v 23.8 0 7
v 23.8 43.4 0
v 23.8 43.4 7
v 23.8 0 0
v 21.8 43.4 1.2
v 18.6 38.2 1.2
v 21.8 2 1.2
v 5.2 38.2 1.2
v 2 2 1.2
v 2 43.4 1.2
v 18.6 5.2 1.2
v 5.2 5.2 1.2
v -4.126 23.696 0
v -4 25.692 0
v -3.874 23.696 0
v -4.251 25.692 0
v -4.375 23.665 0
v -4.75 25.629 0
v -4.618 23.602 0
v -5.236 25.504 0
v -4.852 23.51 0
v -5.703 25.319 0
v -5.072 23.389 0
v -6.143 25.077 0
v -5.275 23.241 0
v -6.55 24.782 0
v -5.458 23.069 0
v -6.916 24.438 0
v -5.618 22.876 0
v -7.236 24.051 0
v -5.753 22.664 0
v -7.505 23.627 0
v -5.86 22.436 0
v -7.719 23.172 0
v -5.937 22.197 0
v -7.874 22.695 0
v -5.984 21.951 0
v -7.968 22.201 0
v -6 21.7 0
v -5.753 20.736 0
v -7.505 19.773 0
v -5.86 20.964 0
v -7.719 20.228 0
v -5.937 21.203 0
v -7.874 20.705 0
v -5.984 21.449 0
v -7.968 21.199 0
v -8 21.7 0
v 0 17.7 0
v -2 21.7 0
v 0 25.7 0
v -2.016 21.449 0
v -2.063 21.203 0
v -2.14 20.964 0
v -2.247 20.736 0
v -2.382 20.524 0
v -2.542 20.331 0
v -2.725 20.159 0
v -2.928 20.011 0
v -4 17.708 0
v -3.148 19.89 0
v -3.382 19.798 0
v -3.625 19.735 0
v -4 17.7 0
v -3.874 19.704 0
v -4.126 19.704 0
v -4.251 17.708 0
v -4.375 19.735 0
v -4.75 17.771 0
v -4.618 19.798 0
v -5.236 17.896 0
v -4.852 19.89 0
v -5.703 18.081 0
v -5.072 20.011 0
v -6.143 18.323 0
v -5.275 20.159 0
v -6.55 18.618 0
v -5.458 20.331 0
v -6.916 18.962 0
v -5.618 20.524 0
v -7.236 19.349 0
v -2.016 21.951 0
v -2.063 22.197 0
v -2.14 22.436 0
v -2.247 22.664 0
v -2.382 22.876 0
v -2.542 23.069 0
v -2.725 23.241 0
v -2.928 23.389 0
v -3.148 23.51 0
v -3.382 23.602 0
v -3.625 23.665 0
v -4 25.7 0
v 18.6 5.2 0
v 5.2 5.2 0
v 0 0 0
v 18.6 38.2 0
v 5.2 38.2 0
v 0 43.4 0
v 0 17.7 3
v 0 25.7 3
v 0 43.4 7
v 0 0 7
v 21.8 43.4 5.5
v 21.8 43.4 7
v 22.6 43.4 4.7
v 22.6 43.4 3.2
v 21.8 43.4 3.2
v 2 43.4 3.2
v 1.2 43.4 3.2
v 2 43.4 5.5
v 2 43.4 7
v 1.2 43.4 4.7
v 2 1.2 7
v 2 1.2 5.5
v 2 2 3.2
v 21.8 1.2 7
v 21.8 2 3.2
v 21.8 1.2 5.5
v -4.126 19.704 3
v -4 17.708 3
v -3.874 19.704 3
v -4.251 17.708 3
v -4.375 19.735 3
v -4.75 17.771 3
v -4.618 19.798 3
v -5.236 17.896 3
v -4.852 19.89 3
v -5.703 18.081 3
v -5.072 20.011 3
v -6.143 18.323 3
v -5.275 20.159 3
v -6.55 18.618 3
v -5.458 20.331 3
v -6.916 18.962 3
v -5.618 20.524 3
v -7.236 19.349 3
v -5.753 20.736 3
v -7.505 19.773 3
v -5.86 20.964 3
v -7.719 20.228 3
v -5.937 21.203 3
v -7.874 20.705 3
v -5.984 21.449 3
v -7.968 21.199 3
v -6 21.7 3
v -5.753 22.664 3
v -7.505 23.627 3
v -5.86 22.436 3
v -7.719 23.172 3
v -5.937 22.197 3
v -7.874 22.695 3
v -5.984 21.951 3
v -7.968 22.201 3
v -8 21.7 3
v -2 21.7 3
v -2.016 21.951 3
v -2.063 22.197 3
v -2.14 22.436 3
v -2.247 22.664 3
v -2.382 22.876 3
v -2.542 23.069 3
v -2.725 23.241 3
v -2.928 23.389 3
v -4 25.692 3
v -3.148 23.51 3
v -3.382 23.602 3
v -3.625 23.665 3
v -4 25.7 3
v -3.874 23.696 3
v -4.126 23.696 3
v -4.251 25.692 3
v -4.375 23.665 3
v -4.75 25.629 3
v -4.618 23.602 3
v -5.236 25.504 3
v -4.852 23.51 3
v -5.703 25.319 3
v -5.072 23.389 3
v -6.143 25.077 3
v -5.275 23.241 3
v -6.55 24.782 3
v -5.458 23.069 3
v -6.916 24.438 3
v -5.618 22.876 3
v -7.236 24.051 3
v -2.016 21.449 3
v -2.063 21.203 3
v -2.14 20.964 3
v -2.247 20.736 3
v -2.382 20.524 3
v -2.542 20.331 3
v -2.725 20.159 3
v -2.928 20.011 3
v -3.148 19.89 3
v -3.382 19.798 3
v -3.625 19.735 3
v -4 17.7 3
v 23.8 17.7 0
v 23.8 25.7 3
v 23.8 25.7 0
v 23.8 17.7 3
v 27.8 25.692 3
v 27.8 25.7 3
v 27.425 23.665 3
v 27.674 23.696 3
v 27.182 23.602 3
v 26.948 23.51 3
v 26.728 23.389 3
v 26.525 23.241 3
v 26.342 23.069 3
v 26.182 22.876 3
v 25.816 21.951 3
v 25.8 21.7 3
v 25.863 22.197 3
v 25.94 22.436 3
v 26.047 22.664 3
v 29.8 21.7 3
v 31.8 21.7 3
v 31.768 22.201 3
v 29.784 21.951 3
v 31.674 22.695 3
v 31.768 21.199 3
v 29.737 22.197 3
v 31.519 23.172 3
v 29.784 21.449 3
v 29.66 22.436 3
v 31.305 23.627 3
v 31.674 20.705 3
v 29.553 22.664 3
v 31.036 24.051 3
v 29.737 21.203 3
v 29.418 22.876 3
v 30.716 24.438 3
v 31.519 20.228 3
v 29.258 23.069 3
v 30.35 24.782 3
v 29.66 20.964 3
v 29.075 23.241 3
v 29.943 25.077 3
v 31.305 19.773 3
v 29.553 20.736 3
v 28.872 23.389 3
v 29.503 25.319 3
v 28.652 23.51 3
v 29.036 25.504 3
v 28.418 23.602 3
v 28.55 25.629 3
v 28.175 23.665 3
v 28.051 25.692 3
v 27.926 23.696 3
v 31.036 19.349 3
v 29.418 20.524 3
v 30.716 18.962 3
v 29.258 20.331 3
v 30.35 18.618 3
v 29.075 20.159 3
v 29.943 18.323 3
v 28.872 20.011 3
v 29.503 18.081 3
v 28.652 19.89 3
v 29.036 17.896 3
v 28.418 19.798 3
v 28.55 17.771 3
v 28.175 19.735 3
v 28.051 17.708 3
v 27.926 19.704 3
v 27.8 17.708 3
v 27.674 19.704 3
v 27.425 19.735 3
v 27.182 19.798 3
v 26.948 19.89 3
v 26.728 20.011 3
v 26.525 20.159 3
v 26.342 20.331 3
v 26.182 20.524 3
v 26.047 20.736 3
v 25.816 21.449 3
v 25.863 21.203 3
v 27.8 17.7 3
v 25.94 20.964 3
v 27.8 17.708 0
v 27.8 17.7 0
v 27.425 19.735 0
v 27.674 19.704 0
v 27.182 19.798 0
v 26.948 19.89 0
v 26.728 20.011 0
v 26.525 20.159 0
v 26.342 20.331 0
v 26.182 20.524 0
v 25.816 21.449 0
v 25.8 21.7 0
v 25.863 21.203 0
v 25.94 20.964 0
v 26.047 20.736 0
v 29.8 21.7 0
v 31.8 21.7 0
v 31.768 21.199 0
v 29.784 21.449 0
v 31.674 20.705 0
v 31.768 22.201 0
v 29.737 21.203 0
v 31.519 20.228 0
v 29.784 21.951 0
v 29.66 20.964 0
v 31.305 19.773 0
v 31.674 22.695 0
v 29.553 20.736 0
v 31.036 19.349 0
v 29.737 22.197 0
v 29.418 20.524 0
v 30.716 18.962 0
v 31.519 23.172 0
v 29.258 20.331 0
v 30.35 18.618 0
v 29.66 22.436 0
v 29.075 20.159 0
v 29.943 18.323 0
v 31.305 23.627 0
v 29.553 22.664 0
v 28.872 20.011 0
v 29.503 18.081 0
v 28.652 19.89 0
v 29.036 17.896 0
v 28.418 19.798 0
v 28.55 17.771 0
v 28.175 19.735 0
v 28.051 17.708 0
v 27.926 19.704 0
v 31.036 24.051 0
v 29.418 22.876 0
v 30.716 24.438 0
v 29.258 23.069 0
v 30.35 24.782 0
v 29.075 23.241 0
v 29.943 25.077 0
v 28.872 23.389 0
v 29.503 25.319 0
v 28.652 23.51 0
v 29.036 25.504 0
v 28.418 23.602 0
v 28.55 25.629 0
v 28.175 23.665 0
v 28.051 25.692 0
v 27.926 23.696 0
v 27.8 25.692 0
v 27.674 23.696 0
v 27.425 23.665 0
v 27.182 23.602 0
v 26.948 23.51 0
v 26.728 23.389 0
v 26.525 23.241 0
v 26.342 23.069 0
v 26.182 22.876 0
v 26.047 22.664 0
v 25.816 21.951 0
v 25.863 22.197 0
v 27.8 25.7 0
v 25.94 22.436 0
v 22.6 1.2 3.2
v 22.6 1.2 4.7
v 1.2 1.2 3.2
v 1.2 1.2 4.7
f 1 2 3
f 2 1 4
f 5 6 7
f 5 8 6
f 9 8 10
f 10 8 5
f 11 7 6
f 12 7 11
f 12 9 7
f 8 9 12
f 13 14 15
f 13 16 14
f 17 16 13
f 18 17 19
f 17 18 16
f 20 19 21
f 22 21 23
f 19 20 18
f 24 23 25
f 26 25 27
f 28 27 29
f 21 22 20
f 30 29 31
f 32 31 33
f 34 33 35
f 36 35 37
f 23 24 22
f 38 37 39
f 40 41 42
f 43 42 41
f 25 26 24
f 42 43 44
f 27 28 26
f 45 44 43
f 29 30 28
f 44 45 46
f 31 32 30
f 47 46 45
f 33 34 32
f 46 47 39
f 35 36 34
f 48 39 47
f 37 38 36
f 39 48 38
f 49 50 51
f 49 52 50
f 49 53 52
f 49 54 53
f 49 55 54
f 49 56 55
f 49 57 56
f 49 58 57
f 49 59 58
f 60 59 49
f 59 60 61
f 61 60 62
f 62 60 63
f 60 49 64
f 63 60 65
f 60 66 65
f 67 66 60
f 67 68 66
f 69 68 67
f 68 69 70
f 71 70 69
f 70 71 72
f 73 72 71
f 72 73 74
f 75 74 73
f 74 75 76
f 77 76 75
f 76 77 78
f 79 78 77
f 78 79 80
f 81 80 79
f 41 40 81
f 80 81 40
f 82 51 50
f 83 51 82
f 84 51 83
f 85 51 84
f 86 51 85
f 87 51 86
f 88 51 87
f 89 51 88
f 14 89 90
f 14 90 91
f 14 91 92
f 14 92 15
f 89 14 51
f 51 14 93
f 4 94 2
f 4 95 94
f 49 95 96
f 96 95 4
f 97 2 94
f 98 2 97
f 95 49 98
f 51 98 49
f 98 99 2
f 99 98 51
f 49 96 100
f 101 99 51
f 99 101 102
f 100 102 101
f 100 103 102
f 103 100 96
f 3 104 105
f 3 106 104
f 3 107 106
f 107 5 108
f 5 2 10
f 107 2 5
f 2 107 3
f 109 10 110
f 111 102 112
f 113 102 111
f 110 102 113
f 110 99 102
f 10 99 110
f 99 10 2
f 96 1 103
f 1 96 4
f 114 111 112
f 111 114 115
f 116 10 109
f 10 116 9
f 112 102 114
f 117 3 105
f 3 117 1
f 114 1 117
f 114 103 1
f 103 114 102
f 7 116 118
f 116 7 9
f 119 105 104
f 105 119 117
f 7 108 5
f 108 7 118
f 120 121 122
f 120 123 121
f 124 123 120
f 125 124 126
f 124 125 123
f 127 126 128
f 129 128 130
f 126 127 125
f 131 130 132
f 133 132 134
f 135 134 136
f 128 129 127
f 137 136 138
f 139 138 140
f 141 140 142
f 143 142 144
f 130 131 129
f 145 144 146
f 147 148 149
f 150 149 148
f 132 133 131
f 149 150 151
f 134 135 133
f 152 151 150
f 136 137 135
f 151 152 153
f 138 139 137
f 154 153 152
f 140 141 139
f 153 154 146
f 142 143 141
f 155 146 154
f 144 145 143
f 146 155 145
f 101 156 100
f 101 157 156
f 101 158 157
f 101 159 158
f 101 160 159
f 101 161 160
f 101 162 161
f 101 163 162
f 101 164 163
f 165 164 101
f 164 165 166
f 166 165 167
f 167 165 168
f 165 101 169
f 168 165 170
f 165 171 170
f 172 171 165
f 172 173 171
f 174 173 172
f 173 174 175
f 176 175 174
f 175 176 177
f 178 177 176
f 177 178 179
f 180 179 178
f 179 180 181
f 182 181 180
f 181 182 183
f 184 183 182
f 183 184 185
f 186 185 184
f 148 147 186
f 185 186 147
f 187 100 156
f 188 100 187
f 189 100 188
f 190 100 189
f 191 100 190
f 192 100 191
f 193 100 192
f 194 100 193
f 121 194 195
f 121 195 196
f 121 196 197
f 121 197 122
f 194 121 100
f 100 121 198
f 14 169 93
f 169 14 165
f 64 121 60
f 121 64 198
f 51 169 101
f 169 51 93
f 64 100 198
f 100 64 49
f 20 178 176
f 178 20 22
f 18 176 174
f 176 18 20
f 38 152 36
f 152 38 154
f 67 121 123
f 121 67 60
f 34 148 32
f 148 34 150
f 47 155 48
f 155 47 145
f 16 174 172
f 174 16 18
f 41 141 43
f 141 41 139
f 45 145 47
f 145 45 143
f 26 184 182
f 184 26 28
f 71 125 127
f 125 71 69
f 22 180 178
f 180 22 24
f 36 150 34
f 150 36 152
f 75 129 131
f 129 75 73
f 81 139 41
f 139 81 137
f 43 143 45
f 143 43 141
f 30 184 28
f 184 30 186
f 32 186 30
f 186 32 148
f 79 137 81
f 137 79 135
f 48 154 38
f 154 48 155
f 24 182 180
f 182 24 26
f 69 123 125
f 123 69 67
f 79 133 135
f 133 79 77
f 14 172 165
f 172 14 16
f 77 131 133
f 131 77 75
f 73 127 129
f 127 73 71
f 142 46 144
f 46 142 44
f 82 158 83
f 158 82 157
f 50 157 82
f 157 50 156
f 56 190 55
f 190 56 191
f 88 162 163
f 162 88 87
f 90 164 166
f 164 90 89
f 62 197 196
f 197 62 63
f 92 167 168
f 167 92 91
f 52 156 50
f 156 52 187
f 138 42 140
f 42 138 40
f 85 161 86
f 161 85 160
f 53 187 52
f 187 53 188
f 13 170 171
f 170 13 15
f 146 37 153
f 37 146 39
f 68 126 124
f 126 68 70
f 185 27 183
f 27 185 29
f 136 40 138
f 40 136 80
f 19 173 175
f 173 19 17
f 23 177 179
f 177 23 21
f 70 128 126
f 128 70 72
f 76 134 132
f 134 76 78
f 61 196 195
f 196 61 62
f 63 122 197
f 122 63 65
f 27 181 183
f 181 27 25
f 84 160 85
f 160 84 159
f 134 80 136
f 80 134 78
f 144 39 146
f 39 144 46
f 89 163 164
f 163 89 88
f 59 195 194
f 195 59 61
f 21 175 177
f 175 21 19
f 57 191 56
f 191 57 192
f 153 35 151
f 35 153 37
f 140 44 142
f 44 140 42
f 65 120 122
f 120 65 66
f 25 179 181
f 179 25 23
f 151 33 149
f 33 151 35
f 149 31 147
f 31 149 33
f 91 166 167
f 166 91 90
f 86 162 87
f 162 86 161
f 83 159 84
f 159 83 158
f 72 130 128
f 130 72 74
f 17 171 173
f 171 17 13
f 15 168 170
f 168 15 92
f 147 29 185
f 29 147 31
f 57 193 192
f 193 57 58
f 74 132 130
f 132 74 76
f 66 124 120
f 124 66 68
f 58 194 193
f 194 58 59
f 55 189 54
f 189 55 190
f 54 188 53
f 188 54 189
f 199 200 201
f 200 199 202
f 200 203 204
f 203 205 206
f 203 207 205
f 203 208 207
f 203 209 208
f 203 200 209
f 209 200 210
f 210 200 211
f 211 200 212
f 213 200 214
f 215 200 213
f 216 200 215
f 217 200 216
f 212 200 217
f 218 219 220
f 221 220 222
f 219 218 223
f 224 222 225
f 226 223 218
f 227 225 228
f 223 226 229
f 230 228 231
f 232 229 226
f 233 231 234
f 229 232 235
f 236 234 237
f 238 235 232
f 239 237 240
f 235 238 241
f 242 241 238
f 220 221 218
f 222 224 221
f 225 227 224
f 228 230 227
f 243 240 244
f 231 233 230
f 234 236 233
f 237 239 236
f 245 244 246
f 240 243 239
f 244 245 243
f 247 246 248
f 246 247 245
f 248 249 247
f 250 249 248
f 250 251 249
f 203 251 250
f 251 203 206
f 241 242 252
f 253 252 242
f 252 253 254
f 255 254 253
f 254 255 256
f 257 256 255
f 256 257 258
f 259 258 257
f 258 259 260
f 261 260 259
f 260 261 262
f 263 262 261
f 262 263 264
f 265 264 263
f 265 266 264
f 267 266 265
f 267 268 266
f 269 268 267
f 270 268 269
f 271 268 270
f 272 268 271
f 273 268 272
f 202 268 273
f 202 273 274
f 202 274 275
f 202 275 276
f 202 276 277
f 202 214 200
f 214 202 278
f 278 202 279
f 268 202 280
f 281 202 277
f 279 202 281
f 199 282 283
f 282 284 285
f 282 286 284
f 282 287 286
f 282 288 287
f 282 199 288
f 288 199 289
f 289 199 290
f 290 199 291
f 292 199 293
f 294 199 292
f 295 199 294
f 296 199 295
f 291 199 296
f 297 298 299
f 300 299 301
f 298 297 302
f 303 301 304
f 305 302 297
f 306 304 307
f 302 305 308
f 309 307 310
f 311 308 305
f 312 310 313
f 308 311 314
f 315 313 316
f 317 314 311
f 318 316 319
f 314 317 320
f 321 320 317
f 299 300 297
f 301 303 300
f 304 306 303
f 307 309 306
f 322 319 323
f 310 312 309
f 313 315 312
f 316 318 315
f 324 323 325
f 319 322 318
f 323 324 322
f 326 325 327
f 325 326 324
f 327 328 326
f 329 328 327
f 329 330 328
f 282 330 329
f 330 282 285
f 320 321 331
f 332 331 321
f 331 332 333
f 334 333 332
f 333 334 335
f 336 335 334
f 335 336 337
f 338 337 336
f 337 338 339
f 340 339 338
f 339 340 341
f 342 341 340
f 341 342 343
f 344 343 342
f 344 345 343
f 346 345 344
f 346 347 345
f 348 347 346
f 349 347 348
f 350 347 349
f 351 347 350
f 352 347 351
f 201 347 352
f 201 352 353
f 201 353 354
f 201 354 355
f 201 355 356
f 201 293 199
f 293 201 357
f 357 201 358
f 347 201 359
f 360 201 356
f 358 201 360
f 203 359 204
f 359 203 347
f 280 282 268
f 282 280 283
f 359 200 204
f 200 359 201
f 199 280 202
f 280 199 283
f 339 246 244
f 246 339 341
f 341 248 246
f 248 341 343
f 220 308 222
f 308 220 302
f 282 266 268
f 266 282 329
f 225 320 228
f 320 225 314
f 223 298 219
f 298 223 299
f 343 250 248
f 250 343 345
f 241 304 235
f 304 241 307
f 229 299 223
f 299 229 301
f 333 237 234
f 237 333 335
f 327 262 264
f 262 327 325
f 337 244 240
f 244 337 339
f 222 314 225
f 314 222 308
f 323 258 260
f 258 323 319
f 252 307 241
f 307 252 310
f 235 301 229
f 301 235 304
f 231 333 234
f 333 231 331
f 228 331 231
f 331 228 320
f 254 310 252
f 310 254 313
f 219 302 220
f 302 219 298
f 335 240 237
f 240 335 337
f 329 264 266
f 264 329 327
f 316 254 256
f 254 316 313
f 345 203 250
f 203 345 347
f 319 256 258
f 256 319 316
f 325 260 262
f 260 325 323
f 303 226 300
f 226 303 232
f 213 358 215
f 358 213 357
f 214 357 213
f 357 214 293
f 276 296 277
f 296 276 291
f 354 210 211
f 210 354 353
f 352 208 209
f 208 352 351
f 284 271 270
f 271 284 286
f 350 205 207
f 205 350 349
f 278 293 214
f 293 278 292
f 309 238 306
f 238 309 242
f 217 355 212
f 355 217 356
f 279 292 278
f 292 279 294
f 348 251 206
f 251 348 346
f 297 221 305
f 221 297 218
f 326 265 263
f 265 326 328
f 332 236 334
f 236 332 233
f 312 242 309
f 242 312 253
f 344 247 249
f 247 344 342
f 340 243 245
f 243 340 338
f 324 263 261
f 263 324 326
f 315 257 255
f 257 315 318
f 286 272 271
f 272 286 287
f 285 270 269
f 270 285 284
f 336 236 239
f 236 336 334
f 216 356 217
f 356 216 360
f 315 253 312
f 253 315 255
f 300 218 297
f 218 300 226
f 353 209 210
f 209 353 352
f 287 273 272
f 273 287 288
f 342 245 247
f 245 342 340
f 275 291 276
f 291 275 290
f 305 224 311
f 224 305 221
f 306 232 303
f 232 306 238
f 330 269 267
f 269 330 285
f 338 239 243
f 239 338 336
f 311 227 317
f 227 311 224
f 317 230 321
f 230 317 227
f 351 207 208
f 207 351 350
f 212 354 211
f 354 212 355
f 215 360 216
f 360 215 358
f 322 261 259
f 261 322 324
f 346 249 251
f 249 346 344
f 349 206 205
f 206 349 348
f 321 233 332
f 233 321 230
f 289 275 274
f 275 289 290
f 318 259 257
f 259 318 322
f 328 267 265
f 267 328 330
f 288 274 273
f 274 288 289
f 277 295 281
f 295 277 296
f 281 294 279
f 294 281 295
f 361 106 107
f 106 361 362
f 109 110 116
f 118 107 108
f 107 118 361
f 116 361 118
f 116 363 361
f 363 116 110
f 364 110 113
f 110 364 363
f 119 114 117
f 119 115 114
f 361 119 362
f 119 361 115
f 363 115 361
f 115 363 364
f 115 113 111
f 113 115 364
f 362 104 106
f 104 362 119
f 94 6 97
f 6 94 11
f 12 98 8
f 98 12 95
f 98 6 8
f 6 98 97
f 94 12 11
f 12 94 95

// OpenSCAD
// file: ../lib/pcb_led_cvf.scad
// for led power module modified

/* bluetooth_mate_holder.scad
 * By John Biehler - November 17, 2011
 * http://www.thingiverse.com/thing:

 * derived from pcb_box_slide_with_tabs.scad
 * By Nicholas C Lewis - Jan 1, 2011
 * http://www.thingiverse.com/thing:5396
 *
 * derived from pcb_box_slide.scad
 *     Parametric, open PCB-box (slide-in) by chlunde
 *     http://www.thingiverse.com/thing:4071
 *
 * CHANGES
 * - adjusted to fit Arduino Mega
 * - added mounting tabs
 * - turned off cutouts
 * - adjusted bottom cutout size
 */

$fn=50;

module pcb_led_cvf(

	pcb_width = 48.2,
	pcb_length =24.1,
	pcb_height =1.1,
	slisse = 0.8,

	pcb_bottom_margin = 1,
	wall_width_thick = 2,
	box_height = 7,

	//tab parameters
	tab_hole_radius=2,
	tab_outer_radius=4,

	inner_margin = 4,

	add_tabs = true

) {
	wall_width = wall_width_thick-slisse;

module tab() {
	difference(){
		union() {
			translate([-tab_outer_radius,-tab_outer_radius,0])
			cube([tab_outer_radius,2*tab_outer_radius,wall_width_thick+1]);
			translate([-tab_outer_radius,0,0])
				cylinder(r=tab_outer_radius, h = wall_width_thick+1);
		}
		translate([-tab_outer_radius,0,0]) {
			cylinder(r= tab_hole_radius, h = wall_width_thick+5,center=true);
		}
	}

}

module box() {
	union() {
		cube([pcb_width + 2*wall_width, pcb_length + 2*wall_width, wall_width]);

		cube([wall_width_thick, pcb_length + 2*wall_width, box_height]);

		cube([pcb_width + 2*wall_width, wall_width_thick, box_height]);

		%translate([0, pcb_length+wall_width, 0])
			cube([pcb_width + 2*wall_width,wall_width,box_height]);

		translate([pcb_width + wall_width - slisse,0,0])
			cube([wall_width_thick, pcb_length + 2*wall_width, box_height]);
	}
	if(add_tabs) {
//comment out this part to remove tabs
		for(i=[(pcb_length + 2*wall_width)/2]){
	translate([0,i,0])tab();
	translate([pcb_width + 2*wall_width,i,0])mirror()tab();
		}
	}

}

module pcb() {
	translate([wall_width, wall_width, wall_width + pcb_bottom_margin])
		cube([pcb_width,pcb_length + wall_width + 0.1,pcb_height]);
	translate([wall_width, wall_width, wall_width + pcb_bottom_margin+pcb_height])rotate([0,45,0])
		cube([pcb_height,pcb_length + wall_width + 0.1,pcb_height]);
	translate([wall_width+pcb_width-2*cos(45)*pcb_height, wall_width, wall_width + pcb_bottom_margin+pcb_height])rotate([0,45,0])
		cube([pcb_height,pcb_length + wall_width + 0.1,pcb_height]);
	translate([wall_width_thick, wall_width, wall_width + pcb_bottom_margin])
		cube([pcb_width-2*slisse,pcb_length + wall_width + 0.1,box_height]);

}



module holes() {
		*translate([wall_width + pcb_width/2, wall_width_thick + 0.1, pcb_width/2+wall_width])
			rotate(a=90,v=[1,0,0])
				cylinder(r=pcb_width/2, h=wall_width_thick + 0.2);

		*translate([-0.1, wall_width + pcb_length/2, pcb_length/2 + wall_width])
			rotate(a=90,v=[0,1,0])
				cylinder(r=pcb_length/2, h=wall_width_thick + 0.2);

		*translate([pcb_width + wall_width - slisse - 0.1, wall_width + pcb_length/2, pcb_length/2 + wall_width])
			rotate(a=90,v=[0,1,0])
				cylinder(r=pcb_length/2, h=wall_width_thick + 0.2);

	 * translate([pcb_width/2 + wall_width, wall_width + pcb_length/2, -0.1])
			rotate(a=0,v=[0,1,0])
				cylinder(r=min(pcb_length,pcb_width)/2 - wall_width/2, h=wall_width_thick + 0.2);

		translate([inner_margin +wall_width, inner_margin+wall_width, -0.1])
			cube([pcb_width-inner_margin*2,pcb_length -inner_margin*2,wall_width + 0.2]);
}

	difference() {
		box();
		pcb();
		holes();
	}
}



pcb_led_cvf();
// main file
use <../lib/pcb_led_cvf.scad>


pcb_led_cvf(
  pcb_length=41,
  pcb_width=21.4,
  pcb_height=1.5,
  pcb_bottom_margin=2
);
